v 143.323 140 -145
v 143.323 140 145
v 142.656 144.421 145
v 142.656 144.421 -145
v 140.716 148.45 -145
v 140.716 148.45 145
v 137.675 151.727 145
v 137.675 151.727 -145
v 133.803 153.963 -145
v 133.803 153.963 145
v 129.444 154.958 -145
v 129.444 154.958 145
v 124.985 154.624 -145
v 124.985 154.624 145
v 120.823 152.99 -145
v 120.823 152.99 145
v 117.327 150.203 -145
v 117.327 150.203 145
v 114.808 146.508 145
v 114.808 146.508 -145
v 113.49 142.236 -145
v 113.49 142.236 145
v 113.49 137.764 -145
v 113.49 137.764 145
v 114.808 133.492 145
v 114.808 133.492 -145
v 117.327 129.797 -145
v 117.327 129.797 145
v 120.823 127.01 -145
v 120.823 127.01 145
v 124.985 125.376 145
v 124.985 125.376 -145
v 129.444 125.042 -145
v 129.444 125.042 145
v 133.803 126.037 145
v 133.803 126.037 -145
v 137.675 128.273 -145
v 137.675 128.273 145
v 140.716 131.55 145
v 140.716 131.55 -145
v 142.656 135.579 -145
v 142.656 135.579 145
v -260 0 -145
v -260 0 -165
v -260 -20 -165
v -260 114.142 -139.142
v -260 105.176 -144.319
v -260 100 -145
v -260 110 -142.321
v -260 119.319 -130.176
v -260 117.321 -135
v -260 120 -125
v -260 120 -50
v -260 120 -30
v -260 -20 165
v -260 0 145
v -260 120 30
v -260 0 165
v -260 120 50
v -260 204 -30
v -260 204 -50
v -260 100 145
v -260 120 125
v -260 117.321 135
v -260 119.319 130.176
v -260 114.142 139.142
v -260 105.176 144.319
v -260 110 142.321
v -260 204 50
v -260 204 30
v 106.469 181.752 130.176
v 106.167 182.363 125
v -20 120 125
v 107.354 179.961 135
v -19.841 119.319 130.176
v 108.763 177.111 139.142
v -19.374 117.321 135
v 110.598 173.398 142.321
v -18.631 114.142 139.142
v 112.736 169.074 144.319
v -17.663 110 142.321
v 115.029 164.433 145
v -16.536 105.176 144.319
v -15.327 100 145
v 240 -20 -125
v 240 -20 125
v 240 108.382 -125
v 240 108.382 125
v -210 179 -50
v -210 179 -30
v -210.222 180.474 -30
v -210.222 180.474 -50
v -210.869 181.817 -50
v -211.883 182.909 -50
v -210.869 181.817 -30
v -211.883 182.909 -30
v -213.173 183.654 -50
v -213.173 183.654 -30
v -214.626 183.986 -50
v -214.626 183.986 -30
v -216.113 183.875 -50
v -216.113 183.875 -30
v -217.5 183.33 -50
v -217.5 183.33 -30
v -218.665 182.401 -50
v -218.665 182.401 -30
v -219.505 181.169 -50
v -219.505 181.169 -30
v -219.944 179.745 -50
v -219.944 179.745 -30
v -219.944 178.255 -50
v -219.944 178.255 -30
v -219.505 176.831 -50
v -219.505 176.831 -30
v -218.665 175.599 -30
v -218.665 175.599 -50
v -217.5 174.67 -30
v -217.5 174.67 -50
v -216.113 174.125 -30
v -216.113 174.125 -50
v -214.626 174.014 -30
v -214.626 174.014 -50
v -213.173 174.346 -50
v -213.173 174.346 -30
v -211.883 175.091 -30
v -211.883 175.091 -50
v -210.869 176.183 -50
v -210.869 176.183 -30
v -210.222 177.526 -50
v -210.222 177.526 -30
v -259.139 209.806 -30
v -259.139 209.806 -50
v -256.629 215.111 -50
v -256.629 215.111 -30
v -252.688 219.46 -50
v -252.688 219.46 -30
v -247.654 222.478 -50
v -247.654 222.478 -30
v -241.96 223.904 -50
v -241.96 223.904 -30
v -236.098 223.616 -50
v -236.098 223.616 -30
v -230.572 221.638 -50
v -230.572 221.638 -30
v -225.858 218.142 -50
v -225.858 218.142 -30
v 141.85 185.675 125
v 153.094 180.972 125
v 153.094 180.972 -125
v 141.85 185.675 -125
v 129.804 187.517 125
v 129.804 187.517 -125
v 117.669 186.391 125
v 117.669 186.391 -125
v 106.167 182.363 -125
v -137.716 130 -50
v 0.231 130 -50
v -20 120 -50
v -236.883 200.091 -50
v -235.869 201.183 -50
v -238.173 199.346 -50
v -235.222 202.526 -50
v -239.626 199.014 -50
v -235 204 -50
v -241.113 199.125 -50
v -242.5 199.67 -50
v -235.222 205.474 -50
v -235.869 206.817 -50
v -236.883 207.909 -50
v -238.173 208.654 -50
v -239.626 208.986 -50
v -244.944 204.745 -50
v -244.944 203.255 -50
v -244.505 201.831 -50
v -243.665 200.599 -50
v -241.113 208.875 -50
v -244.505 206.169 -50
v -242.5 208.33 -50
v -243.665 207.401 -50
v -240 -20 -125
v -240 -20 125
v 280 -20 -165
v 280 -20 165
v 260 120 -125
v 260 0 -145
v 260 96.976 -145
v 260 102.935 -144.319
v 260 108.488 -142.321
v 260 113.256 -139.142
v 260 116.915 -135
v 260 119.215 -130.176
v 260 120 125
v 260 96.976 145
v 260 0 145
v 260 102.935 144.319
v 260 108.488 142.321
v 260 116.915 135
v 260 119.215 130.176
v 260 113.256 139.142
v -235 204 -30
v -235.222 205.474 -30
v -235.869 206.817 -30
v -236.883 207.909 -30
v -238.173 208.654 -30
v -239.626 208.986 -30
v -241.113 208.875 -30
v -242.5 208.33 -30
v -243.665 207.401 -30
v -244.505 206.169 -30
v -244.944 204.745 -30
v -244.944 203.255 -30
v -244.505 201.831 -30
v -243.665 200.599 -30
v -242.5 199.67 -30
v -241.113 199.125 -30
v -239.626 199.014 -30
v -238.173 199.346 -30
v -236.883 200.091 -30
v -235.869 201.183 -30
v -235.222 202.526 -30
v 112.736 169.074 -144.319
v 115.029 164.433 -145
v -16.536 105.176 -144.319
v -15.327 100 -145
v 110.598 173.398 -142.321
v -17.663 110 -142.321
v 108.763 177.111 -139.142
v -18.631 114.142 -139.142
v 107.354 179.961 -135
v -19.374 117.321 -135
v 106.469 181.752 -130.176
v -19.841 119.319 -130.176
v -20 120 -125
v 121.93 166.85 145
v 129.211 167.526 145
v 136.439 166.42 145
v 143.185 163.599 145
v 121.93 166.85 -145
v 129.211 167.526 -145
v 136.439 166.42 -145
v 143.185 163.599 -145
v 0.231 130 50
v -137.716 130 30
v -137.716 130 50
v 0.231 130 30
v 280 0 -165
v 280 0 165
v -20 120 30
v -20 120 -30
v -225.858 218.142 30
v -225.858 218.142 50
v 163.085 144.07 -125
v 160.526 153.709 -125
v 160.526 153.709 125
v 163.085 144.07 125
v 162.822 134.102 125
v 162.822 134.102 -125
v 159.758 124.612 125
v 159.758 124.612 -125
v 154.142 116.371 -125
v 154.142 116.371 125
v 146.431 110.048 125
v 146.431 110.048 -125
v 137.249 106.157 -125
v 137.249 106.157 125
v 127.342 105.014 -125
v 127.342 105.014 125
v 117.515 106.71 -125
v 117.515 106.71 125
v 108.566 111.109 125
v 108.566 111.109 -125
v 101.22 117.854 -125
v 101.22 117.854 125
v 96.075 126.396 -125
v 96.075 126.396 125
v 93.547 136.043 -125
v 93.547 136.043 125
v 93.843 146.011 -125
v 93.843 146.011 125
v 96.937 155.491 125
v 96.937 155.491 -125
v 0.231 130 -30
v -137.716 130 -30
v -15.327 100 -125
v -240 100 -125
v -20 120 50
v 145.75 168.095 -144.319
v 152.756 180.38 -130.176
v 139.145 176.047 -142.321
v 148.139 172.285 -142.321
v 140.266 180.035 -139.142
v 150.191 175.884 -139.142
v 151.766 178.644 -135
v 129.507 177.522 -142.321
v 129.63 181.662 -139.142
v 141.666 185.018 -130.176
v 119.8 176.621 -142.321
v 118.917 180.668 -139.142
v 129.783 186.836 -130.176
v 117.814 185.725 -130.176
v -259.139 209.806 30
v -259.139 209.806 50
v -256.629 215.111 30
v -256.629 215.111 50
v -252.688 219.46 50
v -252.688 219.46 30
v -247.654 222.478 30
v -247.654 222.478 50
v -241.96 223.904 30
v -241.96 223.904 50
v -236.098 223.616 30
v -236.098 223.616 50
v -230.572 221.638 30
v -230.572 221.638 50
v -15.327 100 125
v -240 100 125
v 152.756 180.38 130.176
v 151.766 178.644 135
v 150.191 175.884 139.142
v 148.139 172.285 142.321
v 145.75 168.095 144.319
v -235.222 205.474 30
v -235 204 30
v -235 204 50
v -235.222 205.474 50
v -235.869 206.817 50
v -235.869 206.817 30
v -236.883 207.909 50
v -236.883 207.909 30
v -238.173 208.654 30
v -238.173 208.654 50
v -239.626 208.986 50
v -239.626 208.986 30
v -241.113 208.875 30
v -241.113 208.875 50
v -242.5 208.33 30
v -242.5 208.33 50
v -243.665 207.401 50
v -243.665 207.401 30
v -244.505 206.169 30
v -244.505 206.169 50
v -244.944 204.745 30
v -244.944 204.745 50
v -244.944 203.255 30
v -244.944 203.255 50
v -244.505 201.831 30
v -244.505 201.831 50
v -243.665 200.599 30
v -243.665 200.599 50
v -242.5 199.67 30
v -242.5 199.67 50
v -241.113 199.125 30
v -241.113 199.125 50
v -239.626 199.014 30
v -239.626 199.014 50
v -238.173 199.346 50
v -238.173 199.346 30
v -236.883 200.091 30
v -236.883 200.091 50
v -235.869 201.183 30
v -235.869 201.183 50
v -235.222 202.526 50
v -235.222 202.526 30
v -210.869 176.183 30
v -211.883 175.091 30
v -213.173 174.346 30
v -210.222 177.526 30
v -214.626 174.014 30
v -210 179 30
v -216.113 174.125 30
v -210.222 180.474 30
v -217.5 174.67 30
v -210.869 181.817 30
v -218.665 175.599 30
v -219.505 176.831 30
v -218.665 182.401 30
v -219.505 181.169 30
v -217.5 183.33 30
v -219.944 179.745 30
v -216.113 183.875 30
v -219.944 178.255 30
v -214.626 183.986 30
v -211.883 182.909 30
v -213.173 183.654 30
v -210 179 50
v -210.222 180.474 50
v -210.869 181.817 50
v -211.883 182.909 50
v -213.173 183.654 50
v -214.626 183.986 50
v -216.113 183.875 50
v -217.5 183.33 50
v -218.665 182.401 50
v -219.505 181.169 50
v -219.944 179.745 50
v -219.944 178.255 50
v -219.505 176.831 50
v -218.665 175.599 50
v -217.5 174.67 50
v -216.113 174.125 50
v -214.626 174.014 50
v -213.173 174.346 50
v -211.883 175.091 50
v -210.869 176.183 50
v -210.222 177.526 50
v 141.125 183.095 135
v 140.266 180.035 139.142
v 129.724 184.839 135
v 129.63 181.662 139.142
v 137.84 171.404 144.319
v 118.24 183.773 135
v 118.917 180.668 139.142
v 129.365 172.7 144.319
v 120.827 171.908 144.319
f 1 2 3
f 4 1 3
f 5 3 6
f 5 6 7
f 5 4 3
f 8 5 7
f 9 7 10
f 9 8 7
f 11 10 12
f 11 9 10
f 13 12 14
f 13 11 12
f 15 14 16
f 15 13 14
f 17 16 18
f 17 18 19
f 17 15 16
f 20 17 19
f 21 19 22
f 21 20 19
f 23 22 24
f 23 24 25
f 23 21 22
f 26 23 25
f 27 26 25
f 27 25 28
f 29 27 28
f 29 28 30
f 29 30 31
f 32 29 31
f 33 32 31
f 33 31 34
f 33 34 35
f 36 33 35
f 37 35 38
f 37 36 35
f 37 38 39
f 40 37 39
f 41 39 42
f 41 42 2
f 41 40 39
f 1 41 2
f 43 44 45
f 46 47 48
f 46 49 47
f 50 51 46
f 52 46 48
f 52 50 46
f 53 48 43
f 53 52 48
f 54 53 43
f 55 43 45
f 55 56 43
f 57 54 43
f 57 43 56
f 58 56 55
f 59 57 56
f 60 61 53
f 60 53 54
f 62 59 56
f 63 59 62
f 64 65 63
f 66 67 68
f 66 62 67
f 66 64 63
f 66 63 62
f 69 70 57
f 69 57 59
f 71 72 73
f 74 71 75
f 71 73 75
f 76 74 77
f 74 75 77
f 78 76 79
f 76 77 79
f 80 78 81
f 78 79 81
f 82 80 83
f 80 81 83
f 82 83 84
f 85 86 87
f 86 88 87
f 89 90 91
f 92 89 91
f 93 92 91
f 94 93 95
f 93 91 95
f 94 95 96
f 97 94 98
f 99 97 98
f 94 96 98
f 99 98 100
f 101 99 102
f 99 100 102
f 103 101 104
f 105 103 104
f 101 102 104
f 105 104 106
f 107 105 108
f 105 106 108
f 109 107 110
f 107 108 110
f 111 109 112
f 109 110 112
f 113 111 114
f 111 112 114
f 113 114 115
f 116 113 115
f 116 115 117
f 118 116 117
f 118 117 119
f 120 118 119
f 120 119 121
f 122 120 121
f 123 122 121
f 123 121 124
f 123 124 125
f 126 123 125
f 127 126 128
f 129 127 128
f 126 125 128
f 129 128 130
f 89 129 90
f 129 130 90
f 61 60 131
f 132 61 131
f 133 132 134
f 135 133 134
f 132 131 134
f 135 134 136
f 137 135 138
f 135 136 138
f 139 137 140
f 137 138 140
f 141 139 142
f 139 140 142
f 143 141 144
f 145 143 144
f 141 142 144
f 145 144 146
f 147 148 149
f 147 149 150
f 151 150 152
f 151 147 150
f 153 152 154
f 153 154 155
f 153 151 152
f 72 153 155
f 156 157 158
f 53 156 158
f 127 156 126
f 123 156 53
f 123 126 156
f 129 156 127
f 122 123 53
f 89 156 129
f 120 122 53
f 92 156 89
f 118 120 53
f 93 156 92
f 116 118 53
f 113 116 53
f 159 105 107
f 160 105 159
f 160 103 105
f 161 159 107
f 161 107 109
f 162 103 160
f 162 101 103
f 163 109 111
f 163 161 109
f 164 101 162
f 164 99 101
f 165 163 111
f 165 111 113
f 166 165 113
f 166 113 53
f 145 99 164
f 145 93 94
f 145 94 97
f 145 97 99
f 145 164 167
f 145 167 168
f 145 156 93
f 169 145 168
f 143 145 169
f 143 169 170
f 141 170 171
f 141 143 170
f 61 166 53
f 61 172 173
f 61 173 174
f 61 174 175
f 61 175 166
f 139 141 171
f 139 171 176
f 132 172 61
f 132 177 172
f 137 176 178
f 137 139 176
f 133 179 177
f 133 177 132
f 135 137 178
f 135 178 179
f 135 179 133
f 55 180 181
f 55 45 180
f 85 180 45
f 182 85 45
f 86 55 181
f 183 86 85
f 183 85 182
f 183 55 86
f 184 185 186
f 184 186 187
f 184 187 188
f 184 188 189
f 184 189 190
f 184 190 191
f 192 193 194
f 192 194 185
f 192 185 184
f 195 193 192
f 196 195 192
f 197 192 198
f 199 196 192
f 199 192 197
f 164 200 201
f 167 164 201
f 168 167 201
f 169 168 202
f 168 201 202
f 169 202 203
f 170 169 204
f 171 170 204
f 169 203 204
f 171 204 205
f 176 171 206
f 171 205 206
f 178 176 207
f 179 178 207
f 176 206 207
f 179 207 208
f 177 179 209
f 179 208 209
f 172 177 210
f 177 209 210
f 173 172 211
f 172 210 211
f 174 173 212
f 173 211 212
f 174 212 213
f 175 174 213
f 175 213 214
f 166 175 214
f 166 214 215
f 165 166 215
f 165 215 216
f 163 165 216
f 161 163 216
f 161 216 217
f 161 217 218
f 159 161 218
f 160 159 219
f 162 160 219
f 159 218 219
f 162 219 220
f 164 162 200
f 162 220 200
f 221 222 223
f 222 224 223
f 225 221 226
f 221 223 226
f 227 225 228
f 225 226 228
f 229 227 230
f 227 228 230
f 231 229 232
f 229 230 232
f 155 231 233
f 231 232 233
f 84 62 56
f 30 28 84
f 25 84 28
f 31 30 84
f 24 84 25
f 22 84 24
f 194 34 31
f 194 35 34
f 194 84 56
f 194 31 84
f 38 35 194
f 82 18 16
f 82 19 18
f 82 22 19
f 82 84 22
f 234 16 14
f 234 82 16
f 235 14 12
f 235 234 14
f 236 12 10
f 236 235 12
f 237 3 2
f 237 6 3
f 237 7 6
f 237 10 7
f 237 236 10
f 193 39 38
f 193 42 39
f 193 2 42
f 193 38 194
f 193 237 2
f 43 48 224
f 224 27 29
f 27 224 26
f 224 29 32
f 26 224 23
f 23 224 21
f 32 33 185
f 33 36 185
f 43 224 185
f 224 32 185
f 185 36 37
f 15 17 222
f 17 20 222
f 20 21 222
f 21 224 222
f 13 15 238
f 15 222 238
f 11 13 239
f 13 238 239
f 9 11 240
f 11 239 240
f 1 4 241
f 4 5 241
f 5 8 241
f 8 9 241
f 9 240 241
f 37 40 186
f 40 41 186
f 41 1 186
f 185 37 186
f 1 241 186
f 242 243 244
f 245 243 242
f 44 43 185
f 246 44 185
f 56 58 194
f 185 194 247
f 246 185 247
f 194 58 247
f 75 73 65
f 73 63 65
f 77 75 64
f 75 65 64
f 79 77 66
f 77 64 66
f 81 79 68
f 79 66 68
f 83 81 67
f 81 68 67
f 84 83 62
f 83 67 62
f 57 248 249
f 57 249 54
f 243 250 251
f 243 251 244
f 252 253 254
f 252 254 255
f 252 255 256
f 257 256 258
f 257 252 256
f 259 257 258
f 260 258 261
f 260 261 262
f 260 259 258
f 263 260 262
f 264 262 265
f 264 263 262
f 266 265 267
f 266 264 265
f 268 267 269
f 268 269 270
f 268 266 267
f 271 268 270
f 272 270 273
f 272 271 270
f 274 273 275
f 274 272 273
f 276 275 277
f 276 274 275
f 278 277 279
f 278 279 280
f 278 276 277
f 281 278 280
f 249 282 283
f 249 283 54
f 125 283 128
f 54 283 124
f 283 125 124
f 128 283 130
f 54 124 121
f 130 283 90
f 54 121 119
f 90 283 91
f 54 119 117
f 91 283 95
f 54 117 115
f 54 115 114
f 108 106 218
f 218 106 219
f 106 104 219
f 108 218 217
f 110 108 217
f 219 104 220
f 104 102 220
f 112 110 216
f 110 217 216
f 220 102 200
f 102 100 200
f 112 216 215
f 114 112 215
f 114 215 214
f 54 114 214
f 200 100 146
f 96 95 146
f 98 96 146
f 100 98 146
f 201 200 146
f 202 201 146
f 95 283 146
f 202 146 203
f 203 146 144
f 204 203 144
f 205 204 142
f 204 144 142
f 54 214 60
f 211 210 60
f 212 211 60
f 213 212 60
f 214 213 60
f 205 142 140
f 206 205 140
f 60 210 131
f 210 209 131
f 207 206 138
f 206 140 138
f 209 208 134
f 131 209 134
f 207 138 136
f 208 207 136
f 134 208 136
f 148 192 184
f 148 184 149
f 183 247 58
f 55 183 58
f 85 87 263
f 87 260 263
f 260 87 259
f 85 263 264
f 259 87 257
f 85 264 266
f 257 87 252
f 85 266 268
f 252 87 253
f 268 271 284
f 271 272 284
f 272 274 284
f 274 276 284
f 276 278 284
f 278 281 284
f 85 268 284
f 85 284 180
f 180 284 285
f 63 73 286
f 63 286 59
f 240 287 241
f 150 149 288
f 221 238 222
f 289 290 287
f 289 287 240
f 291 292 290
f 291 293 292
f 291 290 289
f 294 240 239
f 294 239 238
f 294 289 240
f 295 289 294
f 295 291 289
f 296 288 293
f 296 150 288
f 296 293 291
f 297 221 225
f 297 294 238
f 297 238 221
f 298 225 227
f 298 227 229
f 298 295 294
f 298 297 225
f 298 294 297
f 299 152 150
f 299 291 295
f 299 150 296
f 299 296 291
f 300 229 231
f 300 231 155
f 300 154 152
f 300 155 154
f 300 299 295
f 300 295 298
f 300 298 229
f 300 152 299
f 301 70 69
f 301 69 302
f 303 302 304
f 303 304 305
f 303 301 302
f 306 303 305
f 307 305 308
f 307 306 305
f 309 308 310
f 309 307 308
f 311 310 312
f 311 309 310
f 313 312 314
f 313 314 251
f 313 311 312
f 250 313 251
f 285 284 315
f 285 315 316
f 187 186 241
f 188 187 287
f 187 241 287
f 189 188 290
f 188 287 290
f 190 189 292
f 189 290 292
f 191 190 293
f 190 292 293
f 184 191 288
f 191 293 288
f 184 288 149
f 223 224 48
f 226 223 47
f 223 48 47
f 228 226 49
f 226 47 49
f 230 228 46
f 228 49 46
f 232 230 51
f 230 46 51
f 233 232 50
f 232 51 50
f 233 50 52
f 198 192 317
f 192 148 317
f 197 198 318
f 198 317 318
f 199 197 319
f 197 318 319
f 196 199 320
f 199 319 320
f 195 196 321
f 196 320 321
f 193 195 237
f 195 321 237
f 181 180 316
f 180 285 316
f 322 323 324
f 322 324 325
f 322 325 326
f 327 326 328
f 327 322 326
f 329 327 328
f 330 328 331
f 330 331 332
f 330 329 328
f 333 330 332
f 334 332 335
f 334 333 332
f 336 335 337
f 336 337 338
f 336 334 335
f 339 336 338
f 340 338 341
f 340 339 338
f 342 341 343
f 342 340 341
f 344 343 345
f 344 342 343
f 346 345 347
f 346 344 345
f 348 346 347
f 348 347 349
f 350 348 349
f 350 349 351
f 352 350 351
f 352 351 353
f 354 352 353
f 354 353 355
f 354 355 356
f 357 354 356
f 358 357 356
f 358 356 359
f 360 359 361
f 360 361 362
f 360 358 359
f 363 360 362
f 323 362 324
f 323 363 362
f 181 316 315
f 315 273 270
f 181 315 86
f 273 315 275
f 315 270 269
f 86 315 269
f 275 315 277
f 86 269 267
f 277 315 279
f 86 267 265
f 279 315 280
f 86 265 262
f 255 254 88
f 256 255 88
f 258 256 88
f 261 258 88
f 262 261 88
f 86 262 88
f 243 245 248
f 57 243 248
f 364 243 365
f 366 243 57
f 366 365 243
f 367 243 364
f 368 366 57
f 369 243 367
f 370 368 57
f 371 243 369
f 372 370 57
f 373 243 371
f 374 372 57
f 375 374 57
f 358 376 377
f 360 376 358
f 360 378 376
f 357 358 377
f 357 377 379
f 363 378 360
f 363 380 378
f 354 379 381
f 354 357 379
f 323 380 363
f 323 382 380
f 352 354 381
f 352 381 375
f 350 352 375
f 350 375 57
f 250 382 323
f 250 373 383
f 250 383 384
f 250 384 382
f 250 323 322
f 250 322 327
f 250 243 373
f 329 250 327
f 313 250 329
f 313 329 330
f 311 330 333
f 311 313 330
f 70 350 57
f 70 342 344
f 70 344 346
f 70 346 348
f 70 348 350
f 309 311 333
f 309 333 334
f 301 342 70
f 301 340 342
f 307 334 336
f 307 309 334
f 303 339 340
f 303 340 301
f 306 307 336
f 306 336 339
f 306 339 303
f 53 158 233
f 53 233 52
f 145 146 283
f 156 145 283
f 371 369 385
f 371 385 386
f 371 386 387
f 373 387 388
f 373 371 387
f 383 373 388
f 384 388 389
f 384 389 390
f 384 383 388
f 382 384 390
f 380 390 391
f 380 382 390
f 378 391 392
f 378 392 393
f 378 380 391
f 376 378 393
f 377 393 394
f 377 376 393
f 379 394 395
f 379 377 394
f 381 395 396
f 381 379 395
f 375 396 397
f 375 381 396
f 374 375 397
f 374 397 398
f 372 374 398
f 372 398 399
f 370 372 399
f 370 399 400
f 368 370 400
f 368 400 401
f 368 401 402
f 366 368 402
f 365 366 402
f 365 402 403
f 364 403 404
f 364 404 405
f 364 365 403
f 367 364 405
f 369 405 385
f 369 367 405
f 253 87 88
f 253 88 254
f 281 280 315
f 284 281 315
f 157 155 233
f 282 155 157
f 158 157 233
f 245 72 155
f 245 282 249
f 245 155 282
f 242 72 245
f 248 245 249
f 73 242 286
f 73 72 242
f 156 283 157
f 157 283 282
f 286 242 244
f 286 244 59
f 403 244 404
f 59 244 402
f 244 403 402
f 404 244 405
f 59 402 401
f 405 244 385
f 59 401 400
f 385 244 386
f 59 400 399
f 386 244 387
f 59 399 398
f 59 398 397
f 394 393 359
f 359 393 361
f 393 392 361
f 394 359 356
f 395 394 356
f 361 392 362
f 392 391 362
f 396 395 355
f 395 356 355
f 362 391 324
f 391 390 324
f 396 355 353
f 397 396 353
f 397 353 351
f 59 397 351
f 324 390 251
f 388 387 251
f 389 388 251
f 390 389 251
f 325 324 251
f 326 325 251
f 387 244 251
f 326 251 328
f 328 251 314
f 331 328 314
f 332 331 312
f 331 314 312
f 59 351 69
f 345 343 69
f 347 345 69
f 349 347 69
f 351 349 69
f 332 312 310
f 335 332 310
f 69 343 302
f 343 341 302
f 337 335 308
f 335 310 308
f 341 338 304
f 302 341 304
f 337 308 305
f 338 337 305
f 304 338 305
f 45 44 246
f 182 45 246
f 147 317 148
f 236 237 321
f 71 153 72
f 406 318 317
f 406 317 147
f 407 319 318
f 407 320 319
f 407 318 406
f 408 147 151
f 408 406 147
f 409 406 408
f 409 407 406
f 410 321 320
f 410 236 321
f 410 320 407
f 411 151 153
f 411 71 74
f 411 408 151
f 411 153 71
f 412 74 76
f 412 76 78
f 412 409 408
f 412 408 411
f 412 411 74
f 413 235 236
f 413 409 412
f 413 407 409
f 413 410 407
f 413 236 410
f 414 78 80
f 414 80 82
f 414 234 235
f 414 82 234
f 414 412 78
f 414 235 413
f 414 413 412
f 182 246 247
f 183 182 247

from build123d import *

# Parameters (mm, degrees)
SKETCH1_R           = 15
BOSS_EXTRUDE1_DEPTH = 145
BOSS_EXTRUDE2_START = 30
SKETCH2_R           = 5
BOSS_EXTRUDE2_DEPTH = 20
SHELL1_START        = -125
SHELL1_DEPTH        = 250
SKETCH3_W           = 520
SKETCH3_H           = 290
BOSS_EXTRUDE3_DEPTH = 20
FILLET1_R           = 20


# Read off the part's stored shape, not the designer's step: Shell1
with BuildPart() as part:
    # Sketch1 → Boss-Extrude1 (new, symmetric)
    with BuildSketch(Plane.XY):
        with BuildLine():
            Line((-260, 0), (260, 0))
            Line((260, 0), (260, 120))
            Line((260, 120), (153.093568272, 180.972007347))
            ThreePointArc((153.093568272, 180.972007347), (129.803653925, 187.517381697), (106.167012988, 182.362651739))
            Line((106.167012988, 182.362651739), (-20, 120))
            Line((-20, 120), (-260, 120))
            Line((-260, 120), (-260, 0))
        make_face()
        with Locations((128.322579774, 140)):
            Circle(SKETCH1_R, mode=Mode.SUBTRACT)
    extrude(amount=BOSS_EXTRUDE1_DEPTH, both=True)

    # Sketch2 → Boss-Extrude2 (add)
    with BuildSketch(Plane.XY.offset(BOSS_EXTRUDE2_START)):
        with BuildLine():
            Line((-260, 120), (-260, 204))
            ThreePointArc((-260, 204), (-247.653668647, 222.47759065), (-225.857864376, 218.142135624))
            Line((-225.857864376, 218.142135624), (-137.715728753, 130))
            Line((-137.715728753, 130), (0.23118156, 130))
            Line((0.23118156, 130), (-20, 120))
            Line((-20, 120), (-260, 120))
        make_face()
        with Locations((-240, 204)):
            Circle(SKETCH2_R, mode=Mode.SUBTRACT)
        with Locations((-215, 179)):
            Circle(SKETCH2_R, mode=Mode.SUBTRACT)
    boss_extrude2 = extrude(amount=BOSS_EXTRUDE2_DEPTH)

    # Mirror1: Boss-Extrude2 across plane
    add(boss_extrude2.mirror(Plane.XY))

    # Shell1 outline → Shell1 (cut)
    with BuildSketch(Plane.XY.offset(SHELL1_START)):
        with BuildLine():
            Line((96.937260838, 155.490698991), (-15.32697978, 100))
            Line((-15.32697978, 100), (-240, 100))
            Line((-240, 100), (-240, 0))
            Line((-240, 0), (240, 0))
            Line((240, 0), (240, 108.382476706))
            Line((240, 108.382476706), (160.526102167, 153.708871052))
            ThreePointArc((160.526102167, 153.708871052), (127.342226815, 105.013732579), (96.937260838, 155.490698991))
        make_face()
    extrude(amount=SHELL1_DEPTH, mode=Mode.SUBTRACT)

    # Sketch3 → Boss-Extrude3 (add)
    # profile 1 of 2: a face of its own
    with BuildSketch(Plane.XZ):
        Rectangle(SKETCH3_W, SKETCH3_H)
        Polygon((160.526102167, -125), (-240, -125), (-240, 125), (-15.32697978, 125), (93.322579774, 125), (96.937260838, 125), (163.322579774, 125), (240, 125), (240, -125), align=None, mode=Mode.SUBTRACT)
    # profile 2 of 2: a face of its own
    with BuildSketch(Plane.XZ):
        Polygon((280, 165), (-260, 165), (-260, 145), (260, 145), (260, -145), (-260, -145), (-260, -165), (280, -165), align=None)
    extrude(amount=BOSS_EXTRUDE3_DEPTH)

    # Fillet1
    fillet1_edges = [part.edges().sort_by_distance(p)[0] for p in [
        (129.803653925, 187.517381697, -145),
        (-140, 120, 145),
        (206.546784136, 150.486003673, 145),
        (129.803653925, 187.517381697, 145),
        (206.546784136, 150.486003673, -145),
        (43.083506494, 151.181325869, 145),
        (-140, 120, -145),
        (43.083506494, 151.181325869, -145),
    ]]
    fillet(fillet1_edges, radius=FILLET1_R)


solid = part.part
